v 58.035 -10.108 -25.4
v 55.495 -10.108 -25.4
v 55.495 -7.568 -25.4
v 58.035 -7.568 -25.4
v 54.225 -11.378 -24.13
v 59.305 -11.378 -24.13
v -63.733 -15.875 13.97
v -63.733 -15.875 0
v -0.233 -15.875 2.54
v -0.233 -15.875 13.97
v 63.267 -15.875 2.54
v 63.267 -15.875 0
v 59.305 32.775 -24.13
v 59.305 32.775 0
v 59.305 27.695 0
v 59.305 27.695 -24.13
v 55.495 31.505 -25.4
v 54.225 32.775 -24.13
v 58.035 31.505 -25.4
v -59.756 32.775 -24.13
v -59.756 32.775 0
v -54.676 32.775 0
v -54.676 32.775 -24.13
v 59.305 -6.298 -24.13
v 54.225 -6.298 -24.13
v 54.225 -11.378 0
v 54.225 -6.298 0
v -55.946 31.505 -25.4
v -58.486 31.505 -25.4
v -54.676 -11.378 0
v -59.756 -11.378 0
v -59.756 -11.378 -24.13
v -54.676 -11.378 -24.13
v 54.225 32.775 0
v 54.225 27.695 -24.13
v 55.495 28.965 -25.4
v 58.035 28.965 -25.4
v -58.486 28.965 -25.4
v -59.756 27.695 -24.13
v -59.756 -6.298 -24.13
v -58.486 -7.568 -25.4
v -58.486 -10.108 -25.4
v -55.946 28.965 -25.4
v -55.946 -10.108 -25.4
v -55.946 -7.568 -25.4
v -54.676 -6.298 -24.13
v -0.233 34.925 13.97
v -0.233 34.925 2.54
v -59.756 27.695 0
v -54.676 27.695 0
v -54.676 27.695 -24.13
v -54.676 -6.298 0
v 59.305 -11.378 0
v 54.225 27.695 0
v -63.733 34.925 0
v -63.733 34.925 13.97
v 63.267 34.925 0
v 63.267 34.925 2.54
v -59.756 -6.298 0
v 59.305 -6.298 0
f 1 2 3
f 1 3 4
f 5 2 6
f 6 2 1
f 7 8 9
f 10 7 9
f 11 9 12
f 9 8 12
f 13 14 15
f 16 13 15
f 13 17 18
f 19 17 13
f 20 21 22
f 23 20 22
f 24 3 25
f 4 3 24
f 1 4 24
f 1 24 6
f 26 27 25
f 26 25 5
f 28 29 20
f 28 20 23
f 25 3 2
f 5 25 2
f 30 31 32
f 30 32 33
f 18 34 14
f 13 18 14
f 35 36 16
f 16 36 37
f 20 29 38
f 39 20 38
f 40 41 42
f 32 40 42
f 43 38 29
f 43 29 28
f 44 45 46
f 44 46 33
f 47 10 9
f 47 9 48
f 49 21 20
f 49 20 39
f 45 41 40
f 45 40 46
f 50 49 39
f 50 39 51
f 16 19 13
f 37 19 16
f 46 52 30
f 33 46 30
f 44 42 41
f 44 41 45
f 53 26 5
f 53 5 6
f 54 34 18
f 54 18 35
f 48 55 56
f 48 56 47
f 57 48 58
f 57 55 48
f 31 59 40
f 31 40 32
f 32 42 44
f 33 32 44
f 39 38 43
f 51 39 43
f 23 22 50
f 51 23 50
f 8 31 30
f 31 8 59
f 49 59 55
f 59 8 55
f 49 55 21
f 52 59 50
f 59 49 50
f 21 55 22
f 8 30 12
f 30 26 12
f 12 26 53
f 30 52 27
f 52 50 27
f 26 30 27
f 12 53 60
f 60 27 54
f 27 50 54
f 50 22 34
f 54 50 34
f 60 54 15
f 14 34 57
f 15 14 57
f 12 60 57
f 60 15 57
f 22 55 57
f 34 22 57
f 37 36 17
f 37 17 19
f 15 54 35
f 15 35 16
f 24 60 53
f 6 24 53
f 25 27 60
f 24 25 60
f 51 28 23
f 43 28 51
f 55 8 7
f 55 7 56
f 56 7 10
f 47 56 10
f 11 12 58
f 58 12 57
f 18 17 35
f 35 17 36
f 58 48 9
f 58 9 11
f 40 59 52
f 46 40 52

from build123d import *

# Parameters (mm, degrees)
F0_W     = 127
F0_H     = 50.8
F1_DEPTH = 25.4
F2_W     = 63.5
F2_H     = 50.8
F3_DEPTH = 22.86
F4_W     = 5.08
F4_H     = 5.080003
F4_H_2   = 5.08
F5_DEPTH = 25.4
F6_SIZE  = 1.27
F7_W     = 63.5
F7_H     = 11.43
F8_DEPTH = 62.484


with BuildPart() as f1:
    # F0 (on Top) → F1 (new body)
    with BuildSketch(Plane.XY):
        with Locations((-0.232585, 9.525337)):
            Rectangle(F0_W, F0_H)
    extrude(amount=F1_DEPTH)

    # F2 (on face) → F3 (cut)
    with BuildSketch(Plane.XY.offset(25.4)):
        with Locations((31.517415, 9.525337)):
            Rectangle(F2_W, F2_H)
    extrude(amount=-F3_DEPTH, mode=Mode.SUBTRACT)

    # F4 (on face) → F5 (join)
    with BuildSketch(Plane(origin=(0, 0, 0), x_dir=(1, 0, 0), z_dir=(0, 0, -1))):
        with Locations((-57.216454, 8.838313)):
            Rectangle(F4_W, F4_H)
        with Locations((-57.216454, -30.235119)):
            Rectangle(F4_W, F4_H_2)
        with Locations((56.765015, 8.838313)):
            Rectangle(F4_W, F4_H)
        with Locations((56.765015, -30.235119)):
            Rectangle(F4_W, F4_H_2)
    extrude(amount=F5_DEPTH)

    # F6
    f6_edges = [f1.edges().sort_by_distance(p)[0] for p in [
        (-54.676454, 30.235119, -25.4),
        (-57.216454, 27.695119, -25.4),
        (-59.756454, 30.235119, -25.4),
        (-57.216454, 32.775119, -25.4),
        (59.305015, 30.235119, -25.4),
        (56.765015, 32.775119, -25.4),
        (54.225015, 30.235119, -25.4),
        (56.765015, 27.695119, -25.4),
        (59.305015, -8.838314, -25.4),
        (56.765015, -6.298312, -25.4),
        (54.225015, -8.838314, -25.4),
        (56.765015, -11.378315, -25.4),
        (-54.676454, -8.838314, -25.4),
        (-57.216454, -6.298312, -25.4),
        (-59.756454, -8.838314, -25.4),
        (-57.216454, -11.378315, -25.4),
    ]]
    chamfer(f6_edges, length=F6_SIZE)

    # F7 (on face) → F8 (cut)
    with BuildSketch(Plane.XZ.offset(15.874663)):
        with Locations((-31.982585, 19.685)):
            Rectangle(F7_W, F7_H)
    extrude(amount=-F8_DEPTH, mode=Mode.SUBTRACT)


solid = f1.part
